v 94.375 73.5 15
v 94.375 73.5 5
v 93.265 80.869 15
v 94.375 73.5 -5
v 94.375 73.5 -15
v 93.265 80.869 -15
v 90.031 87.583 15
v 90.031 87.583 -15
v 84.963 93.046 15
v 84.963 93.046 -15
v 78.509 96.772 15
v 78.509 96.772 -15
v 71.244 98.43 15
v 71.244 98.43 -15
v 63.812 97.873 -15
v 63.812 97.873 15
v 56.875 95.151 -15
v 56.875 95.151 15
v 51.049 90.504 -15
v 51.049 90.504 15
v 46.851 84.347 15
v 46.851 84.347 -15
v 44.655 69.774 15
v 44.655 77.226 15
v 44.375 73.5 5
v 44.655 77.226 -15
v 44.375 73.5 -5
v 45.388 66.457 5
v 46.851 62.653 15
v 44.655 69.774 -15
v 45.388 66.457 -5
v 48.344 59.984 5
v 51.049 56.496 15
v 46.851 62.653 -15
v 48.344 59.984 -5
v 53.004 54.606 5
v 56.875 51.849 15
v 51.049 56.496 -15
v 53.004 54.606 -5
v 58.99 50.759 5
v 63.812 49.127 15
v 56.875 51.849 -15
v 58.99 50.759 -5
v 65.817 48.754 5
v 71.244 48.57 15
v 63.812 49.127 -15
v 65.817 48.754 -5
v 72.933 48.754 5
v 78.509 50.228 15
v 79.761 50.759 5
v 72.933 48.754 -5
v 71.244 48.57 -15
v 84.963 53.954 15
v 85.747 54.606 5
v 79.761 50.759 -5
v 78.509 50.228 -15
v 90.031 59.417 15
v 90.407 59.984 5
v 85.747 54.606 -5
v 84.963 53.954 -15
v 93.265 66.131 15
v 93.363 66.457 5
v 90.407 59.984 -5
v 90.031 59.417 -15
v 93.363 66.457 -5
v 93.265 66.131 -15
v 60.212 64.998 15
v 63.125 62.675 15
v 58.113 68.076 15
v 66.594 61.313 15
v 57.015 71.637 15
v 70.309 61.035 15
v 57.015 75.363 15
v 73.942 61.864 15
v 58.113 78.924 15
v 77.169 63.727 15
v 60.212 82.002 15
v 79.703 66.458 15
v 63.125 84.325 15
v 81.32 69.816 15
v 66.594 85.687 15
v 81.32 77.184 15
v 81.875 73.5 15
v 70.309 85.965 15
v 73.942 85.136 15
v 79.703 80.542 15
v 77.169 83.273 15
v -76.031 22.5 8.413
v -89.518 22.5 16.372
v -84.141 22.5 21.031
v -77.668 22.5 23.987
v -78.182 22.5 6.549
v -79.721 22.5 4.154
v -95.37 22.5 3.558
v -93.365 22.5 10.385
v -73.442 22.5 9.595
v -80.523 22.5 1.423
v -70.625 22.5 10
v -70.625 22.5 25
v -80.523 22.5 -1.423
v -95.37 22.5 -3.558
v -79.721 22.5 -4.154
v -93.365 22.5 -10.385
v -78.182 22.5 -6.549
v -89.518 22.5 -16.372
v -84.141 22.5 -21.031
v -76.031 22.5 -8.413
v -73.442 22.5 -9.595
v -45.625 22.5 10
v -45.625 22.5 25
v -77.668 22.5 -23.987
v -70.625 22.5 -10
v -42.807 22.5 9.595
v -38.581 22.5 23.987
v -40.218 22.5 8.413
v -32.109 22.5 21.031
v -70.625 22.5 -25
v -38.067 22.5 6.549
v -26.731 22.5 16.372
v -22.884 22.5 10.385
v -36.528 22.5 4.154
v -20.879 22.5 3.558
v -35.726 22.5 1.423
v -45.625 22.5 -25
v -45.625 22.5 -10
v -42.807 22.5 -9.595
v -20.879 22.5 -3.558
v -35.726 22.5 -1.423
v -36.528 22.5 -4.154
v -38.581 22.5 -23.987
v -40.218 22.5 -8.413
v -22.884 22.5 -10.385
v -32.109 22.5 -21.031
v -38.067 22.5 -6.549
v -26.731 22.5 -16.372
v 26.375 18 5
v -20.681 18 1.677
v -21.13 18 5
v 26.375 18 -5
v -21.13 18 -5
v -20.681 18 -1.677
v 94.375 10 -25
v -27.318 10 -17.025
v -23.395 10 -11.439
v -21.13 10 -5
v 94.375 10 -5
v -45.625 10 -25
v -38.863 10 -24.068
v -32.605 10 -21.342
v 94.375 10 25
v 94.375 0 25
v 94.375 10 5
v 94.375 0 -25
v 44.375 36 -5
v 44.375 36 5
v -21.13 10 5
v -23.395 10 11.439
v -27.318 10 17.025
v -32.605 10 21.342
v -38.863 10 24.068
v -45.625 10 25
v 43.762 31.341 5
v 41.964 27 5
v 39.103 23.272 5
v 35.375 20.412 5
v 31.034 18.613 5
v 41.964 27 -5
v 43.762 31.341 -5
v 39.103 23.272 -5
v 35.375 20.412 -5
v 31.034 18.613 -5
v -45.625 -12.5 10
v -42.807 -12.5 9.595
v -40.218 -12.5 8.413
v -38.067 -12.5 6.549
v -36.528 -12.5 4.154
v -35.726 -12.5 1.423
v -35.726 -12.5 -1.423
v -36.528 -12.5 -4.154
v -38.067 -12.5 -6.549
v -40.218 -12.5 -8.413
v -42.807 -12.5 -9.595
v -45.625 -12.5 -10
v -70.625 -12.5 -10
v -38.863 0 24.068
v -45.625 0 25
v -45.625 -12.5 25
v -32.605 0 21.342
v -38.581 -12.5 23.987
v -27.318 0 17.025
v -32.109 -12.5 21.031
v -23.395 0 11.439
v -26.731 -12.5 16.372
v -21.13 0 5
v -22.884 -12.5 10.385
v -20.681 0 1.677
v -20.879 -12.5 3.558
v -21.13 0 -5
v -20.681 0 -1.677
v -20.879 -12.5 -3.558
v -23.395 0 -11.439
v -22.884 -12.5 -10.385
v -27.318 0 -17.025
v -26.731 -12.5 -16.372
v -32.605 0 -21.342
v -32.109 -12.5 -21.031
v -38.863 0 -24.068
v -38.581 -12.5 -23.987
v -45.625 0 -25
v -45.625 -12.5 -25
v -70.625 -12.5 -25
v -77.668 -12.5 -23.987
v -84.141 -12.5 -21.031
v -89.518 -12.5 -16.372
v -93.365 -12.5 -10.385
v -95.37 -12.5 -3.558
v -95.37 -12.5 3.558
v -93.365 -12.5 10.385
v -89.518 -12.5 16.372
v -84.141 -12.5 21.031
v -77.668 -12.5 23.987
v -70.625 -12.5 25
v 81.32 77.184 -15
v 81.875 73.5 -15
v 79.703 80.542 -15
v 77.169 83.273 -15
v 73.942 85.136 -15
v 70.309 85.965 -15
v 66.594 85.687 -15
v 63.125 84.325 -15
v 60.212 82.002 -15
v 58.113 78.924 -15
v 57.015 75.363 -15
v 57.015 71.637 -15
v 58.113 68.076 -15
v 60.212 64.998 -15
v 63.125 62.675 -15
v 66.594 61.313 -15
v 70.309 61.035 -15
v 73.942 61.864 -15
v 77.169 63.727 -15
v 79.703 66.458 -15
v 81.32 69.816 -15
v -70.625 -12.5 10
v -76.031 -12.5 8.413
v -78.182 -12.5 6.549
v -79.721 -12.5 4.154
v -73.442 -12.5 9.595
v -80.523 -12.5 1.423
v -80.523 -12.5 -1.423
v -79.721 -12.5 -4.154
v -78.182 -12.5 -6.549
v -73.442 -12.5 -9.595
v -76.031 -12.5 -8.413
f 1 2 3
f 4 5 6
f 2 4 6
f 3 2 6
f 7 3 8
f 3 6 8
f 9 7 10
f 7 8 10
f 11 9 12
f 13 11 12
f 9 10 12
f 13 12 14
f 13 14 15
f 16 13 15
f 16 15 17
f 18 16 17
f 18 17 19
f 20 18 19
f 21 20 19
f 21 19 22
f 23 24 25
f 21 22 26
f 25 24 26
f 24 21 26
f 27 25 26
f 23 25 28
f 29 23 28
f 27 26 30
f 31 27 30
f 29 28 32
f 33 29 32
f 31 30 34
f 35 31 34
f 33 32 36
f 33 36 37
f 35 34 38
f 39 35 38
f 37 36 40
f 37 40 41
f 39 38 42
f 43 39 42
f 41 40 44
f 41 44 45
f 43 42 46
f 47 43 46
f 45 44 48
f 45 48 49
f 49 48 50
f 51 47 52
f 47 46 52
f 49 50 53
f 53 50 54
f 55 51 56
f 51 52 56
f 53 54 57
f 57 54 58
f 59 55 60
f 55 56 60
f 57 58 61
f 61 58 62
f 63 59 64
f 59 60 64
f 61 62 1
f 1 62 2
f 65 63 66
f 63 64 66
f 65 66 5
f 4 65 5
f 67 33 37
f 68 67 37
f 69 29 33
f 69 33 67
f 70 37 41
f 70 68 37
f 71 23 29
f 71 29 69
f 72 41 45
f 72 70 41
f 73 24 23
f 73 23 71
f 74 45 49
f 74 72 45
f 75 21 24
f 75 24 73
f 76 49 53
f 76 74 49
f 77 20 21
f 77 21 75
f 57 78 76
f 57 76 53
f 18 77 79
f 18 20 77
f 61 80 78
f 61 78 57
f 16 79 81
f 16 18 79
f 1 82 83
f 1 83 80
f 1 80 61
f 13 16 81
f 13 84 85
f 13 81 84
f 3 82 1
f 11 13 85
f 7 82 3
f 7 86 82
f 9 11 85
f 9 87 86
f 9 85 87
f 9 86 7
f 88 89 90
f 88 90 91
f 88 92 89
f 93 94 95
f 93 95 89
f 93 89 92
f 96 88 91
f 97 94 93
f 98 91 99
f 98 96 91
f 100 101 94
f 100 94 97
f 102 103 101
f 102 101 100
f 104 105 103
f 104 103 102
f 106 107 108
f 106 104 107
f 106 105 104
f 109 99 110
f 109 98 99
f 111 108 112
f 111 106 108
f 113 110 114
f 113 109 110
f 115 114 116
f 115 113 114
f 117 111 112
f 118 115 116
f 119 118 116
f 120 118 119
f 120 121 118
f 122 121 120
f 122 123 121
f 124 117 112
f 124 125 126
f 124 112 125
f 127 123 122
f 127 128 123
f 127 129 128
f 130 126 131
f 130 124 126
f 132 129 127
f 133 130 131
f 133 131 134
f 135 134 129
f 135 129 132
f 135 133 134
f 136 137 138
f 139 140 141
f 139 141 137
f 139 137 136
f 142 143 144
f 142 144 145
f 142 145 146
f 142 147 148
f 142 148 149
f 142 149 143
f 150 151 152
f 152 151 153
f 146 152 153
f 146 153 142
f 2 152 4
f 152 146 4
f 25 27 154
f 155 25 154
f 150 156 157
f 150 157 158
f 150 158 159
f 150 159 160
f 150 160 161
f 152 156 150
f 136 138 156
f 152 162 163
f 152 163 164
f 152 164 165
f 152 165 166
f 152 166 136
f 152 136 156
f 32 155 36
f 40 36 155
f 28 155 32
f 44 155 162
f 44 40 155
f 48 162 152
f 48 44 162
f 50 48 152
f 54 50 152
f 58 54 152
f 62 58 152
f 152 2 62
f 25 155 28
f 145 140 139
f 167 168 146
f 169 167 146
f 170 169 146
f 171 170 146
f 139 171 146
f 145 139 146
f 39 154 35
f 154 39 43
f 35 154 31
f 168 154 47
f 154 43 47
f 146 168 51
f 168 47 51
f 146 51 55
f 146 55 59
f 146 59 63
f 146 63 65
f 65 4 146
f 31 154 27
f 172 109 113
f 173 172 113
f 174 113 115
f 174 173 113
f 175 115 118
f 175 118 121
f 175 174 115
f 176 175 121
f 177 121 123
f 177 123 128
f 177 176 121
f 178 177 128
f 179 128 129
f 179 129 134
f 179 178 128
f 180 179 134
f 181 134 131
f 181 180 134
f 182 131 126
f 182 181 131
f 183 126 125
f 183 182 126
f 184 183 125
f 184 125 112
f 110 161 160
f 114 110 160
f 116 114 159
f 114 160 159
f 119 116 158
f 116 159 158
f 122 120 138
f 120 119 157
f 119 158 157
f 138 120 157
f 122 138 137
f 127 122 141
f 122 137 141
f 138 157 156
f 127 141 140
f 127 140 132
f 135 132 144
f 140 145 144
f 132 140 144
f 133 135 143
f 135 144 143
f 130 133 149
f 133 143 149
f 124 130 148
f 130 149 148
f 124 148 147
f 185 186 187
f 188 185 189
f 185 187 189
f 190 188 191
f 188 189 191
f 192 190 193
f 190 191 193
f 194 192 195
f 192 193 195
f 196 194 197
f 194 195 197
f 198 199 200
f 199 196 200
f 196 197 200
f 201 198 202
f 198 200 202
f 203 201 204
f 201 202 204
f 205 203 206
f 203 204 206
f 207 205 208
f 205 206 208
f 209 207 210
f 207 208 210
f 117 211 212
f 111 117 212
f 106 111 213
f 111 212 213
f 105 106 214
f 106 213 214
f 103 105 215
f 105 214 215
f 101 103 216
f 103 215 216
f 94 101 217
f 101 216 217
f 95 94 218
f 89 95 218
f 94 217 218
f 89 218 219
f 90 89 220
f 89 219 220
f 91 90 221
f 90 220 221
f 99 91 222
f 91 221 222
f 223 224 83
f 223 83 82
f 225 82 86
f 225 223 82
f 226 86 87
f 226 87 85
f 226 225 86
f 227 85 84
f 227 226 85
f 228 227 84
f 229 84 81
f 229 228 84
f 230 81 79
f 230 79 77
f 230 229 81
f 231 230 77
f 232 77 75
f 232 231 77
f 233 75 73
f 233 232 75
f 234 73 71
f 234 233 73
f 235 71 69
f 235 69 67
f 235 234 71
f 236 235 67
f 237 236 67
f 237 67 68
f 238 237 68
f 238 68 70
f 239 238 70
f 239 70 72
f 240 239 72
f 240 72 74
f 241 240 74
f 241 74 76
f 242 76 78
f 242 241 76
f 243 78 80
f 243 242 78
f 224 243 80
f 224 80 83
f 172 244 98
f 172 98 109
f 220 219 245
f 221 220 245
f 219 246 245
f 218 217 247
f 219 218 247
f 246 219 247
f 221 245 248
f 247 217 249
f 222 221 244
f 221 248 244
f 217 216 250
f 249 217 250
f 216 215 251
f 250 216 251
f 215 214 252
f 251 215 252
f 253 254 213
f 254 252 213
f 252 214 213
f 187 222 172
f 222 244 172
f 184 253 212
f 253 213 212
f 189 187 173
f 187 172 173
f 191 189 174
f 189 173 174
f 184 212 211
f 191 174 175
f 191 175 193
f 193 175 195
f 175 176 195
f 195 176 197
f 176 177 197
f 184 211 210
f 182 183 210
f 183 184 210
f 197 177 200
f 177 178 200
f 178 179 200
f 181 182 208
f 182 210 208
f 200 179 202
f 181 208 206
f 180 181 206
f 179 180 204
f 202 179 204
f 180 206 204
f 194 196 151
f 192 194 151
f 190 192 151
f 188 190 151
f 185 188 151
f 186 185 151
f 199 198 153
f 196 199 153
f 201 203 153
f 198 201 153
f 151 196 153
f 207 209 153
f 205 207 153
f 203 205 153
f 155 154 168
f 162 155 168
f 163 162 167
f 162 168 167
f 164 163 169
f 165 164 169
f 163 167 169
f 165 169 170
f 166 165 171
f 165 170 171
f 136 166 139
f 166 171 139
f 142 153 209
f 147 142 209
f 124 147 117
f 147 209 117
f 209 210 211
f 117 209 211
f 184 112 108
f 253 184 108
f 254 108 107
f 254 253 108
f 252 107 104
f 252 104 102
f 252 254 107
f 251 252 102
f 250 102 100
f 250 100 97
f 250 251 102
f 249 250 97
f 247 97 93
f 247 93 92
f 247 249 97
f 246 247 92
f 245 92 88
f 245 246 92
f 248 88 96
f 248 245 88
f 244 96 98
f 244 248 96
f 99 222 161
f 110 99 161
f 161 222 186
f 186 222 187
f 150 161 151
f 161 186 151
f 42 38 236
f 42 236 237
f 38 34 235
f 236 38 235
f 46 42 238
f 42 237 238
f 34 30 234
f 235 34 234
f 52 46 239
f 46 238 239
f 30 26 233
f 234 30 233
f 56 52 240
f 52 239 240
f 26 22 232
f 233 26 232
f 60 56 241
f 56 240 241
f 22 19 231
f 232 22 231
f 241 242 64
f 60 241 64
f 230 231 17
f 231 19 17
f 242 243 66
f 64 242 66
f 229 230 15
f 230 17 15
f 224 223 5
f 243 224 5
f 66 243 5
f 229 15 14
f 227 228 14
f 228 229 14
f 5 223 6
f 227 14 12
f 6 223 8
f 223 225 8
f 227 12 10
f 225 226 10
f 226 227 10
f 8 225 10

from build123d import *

# Parameters (mm, degrees)
BOSS_EXTRUDE10_DEPTH       = 22.5
BOSS_EXTRUDE10_DEPTH_BACK  = 12.5
BOSS_EXTRUDE11_DEPTH       = 10
BOSS_EXTRUDE12_DEPTH       = 18
BOSS_EXTRUDE13_DEPTH       = 5
BOSS_EXTRUDE13_DEPTH_BACK  = 5
BOSS_EXTRUDE14_START       = -15
BOSS_EXTRUDE14_OUTLINE_R   = 25
BOSS_EXTRUDE14_OUTLINE_R_2 = 12.5
BOSS_EXTRUDE14_DEPTH       = 30


# Read off the part's stored shape, not the designer's step: Boss-Extrude14
with BuildPart() as part:
    # Sketch1 → Boss-Extrude10 (new, two sides: drawn at the far end of the back side and taken through both)
    with BuildSketch(Plane(origin=(0, 0, 0), x_dir=(1, 0, 0), z_dir=(0, 1, 0)).offset(-BOSS_EXTRUDE10_DEPTH_BACK)):
        with BuildLine():
            Line((-70.624644485, -25), (-45.624644485, -25))
            ThreePointArc((-45.624644485, -25), (-20.624644485, 0), (-45.624644485, 25))
            Line((-45.624644485, 25), (-70.624644485, 25))
            ThreePointArc((-70.624644485, 25), (-95.624644485, 0), (-70.624644485, -25))
        make_face()
        with BuildLine():
            ThreePointArc((-45.624644485, -10), (-35.624644485, 0), (-45.624644485, 10))
            Line((-45.624644485, 10), (-70.624644485, 10))
            ThreePointArc((-70.624644485, 10), (-80.624644485, 0), (-70.624644485, -10))
            Line((-70.624644485, -10), (-45.624644485, -10))
        make_face(mode=Mode.SUBTRACT)
    extrude(amount=BOSS_EXTRUDE10_DEPTH + BOSS_EXTRUDE10_DEPTH_BACK)

    # Sketch1<6> → Boss-Extrude11 (add)
    with BuildSketch(Plane(origin=(0, 0, 0), x_dir=(1, 0, 0), z_dir=(0, 1, 0))):
        with BuildLine():
            ThreePointArc((-21.129747057, -5), (-29.813256184, -19.364916731), (-45.624644485, -25))
            Line((-45.624644485, -25), (94.375355515, -25))
            Line((94.375355515, -25), (94.375355515, -5))
            Line((94.375355515, -5), (-21.129747057, -5))
        make_face()
        with BuildLine():
            Line((94.375355515, 25), (-45.624644485, 25))
            ThreePointArc((-45.624644485, 25), (-29.813256184, 19.364916731), (-21.129747057, 5))
            Line((-21.129747057, 5), (94.375355515, 5))
            Line((94.375355515, 5), (94.375355515, 25))
        make_face()
    extrude(amount=BOSS_EXTRUDE11_DEPTH)

    # Sketch1<7> → Boss-Extrude12 (add)
    with BuildSketch(Plane(origin=(0, 0, 0), x_dir=(1, 0, 0), z_dir=(0, 1, 0))):
        with BuildLine():
            Line((94.375355515, 5), (-21.129747057, 5))
            ThreePointArc((-21.129747057, 5), (-20.624644485, 0), (-21.129747057, -5))
            Line((-21.129747057, -5), (94.375355515, -5))
            Line((94.375355515, -5), (94.375355515, 5))
        make_face()
    extrude(amount=BOSS_EXTRUDE12_DEPTH)

    # Sketch2 → Boss-Extrude13 (add, two sides: drawn at the far end of the back side and taken through both)
    with BuildSketch(Plane.XY.offset(-BOSS_EXTRUDE13_DEPTH_BACK)):
        with BuildLine():
            ThreePointArc((44.375355515, 36), (39.103277576, 23.272077939), (26.375355515, 18))
            Line((26.375355515, 18), (94.375355515, 18))
            Line((94.375355515, 18), (94.375355515, 73.5))
            ThreePointArc((94.375355515, 73.5), (69.375355515, 48.5), (44.375355515, 73.5))
            Line((44.375355515, 73.5), (44.375355515, 36))
        make_face()
    extrude(amount=BOSS_EXTRUDE13_DEPTH + BOSS_EXTRUDE13_DEPTH_BACK)

    # Boss-Extrude14 outline → Boss-Extrude14 (add)
    with BuildSketch(Plane.XY.offset(BOSS_EXTRUDE14_START)):
        with Locations((69.375355515, 73.5)):
            Circle(BOSS_EXTRUDE14_OUTLINE_R)
        with Locations((69.375355515, 73.5)):
            Circle(BOSS_EXTRUDE14_OUTLINE_R_2, mode=Mode.SUBTRACT)
    extrude(amount=BOSS_EXTRUDE14_DEPTH)


solid = part.part
